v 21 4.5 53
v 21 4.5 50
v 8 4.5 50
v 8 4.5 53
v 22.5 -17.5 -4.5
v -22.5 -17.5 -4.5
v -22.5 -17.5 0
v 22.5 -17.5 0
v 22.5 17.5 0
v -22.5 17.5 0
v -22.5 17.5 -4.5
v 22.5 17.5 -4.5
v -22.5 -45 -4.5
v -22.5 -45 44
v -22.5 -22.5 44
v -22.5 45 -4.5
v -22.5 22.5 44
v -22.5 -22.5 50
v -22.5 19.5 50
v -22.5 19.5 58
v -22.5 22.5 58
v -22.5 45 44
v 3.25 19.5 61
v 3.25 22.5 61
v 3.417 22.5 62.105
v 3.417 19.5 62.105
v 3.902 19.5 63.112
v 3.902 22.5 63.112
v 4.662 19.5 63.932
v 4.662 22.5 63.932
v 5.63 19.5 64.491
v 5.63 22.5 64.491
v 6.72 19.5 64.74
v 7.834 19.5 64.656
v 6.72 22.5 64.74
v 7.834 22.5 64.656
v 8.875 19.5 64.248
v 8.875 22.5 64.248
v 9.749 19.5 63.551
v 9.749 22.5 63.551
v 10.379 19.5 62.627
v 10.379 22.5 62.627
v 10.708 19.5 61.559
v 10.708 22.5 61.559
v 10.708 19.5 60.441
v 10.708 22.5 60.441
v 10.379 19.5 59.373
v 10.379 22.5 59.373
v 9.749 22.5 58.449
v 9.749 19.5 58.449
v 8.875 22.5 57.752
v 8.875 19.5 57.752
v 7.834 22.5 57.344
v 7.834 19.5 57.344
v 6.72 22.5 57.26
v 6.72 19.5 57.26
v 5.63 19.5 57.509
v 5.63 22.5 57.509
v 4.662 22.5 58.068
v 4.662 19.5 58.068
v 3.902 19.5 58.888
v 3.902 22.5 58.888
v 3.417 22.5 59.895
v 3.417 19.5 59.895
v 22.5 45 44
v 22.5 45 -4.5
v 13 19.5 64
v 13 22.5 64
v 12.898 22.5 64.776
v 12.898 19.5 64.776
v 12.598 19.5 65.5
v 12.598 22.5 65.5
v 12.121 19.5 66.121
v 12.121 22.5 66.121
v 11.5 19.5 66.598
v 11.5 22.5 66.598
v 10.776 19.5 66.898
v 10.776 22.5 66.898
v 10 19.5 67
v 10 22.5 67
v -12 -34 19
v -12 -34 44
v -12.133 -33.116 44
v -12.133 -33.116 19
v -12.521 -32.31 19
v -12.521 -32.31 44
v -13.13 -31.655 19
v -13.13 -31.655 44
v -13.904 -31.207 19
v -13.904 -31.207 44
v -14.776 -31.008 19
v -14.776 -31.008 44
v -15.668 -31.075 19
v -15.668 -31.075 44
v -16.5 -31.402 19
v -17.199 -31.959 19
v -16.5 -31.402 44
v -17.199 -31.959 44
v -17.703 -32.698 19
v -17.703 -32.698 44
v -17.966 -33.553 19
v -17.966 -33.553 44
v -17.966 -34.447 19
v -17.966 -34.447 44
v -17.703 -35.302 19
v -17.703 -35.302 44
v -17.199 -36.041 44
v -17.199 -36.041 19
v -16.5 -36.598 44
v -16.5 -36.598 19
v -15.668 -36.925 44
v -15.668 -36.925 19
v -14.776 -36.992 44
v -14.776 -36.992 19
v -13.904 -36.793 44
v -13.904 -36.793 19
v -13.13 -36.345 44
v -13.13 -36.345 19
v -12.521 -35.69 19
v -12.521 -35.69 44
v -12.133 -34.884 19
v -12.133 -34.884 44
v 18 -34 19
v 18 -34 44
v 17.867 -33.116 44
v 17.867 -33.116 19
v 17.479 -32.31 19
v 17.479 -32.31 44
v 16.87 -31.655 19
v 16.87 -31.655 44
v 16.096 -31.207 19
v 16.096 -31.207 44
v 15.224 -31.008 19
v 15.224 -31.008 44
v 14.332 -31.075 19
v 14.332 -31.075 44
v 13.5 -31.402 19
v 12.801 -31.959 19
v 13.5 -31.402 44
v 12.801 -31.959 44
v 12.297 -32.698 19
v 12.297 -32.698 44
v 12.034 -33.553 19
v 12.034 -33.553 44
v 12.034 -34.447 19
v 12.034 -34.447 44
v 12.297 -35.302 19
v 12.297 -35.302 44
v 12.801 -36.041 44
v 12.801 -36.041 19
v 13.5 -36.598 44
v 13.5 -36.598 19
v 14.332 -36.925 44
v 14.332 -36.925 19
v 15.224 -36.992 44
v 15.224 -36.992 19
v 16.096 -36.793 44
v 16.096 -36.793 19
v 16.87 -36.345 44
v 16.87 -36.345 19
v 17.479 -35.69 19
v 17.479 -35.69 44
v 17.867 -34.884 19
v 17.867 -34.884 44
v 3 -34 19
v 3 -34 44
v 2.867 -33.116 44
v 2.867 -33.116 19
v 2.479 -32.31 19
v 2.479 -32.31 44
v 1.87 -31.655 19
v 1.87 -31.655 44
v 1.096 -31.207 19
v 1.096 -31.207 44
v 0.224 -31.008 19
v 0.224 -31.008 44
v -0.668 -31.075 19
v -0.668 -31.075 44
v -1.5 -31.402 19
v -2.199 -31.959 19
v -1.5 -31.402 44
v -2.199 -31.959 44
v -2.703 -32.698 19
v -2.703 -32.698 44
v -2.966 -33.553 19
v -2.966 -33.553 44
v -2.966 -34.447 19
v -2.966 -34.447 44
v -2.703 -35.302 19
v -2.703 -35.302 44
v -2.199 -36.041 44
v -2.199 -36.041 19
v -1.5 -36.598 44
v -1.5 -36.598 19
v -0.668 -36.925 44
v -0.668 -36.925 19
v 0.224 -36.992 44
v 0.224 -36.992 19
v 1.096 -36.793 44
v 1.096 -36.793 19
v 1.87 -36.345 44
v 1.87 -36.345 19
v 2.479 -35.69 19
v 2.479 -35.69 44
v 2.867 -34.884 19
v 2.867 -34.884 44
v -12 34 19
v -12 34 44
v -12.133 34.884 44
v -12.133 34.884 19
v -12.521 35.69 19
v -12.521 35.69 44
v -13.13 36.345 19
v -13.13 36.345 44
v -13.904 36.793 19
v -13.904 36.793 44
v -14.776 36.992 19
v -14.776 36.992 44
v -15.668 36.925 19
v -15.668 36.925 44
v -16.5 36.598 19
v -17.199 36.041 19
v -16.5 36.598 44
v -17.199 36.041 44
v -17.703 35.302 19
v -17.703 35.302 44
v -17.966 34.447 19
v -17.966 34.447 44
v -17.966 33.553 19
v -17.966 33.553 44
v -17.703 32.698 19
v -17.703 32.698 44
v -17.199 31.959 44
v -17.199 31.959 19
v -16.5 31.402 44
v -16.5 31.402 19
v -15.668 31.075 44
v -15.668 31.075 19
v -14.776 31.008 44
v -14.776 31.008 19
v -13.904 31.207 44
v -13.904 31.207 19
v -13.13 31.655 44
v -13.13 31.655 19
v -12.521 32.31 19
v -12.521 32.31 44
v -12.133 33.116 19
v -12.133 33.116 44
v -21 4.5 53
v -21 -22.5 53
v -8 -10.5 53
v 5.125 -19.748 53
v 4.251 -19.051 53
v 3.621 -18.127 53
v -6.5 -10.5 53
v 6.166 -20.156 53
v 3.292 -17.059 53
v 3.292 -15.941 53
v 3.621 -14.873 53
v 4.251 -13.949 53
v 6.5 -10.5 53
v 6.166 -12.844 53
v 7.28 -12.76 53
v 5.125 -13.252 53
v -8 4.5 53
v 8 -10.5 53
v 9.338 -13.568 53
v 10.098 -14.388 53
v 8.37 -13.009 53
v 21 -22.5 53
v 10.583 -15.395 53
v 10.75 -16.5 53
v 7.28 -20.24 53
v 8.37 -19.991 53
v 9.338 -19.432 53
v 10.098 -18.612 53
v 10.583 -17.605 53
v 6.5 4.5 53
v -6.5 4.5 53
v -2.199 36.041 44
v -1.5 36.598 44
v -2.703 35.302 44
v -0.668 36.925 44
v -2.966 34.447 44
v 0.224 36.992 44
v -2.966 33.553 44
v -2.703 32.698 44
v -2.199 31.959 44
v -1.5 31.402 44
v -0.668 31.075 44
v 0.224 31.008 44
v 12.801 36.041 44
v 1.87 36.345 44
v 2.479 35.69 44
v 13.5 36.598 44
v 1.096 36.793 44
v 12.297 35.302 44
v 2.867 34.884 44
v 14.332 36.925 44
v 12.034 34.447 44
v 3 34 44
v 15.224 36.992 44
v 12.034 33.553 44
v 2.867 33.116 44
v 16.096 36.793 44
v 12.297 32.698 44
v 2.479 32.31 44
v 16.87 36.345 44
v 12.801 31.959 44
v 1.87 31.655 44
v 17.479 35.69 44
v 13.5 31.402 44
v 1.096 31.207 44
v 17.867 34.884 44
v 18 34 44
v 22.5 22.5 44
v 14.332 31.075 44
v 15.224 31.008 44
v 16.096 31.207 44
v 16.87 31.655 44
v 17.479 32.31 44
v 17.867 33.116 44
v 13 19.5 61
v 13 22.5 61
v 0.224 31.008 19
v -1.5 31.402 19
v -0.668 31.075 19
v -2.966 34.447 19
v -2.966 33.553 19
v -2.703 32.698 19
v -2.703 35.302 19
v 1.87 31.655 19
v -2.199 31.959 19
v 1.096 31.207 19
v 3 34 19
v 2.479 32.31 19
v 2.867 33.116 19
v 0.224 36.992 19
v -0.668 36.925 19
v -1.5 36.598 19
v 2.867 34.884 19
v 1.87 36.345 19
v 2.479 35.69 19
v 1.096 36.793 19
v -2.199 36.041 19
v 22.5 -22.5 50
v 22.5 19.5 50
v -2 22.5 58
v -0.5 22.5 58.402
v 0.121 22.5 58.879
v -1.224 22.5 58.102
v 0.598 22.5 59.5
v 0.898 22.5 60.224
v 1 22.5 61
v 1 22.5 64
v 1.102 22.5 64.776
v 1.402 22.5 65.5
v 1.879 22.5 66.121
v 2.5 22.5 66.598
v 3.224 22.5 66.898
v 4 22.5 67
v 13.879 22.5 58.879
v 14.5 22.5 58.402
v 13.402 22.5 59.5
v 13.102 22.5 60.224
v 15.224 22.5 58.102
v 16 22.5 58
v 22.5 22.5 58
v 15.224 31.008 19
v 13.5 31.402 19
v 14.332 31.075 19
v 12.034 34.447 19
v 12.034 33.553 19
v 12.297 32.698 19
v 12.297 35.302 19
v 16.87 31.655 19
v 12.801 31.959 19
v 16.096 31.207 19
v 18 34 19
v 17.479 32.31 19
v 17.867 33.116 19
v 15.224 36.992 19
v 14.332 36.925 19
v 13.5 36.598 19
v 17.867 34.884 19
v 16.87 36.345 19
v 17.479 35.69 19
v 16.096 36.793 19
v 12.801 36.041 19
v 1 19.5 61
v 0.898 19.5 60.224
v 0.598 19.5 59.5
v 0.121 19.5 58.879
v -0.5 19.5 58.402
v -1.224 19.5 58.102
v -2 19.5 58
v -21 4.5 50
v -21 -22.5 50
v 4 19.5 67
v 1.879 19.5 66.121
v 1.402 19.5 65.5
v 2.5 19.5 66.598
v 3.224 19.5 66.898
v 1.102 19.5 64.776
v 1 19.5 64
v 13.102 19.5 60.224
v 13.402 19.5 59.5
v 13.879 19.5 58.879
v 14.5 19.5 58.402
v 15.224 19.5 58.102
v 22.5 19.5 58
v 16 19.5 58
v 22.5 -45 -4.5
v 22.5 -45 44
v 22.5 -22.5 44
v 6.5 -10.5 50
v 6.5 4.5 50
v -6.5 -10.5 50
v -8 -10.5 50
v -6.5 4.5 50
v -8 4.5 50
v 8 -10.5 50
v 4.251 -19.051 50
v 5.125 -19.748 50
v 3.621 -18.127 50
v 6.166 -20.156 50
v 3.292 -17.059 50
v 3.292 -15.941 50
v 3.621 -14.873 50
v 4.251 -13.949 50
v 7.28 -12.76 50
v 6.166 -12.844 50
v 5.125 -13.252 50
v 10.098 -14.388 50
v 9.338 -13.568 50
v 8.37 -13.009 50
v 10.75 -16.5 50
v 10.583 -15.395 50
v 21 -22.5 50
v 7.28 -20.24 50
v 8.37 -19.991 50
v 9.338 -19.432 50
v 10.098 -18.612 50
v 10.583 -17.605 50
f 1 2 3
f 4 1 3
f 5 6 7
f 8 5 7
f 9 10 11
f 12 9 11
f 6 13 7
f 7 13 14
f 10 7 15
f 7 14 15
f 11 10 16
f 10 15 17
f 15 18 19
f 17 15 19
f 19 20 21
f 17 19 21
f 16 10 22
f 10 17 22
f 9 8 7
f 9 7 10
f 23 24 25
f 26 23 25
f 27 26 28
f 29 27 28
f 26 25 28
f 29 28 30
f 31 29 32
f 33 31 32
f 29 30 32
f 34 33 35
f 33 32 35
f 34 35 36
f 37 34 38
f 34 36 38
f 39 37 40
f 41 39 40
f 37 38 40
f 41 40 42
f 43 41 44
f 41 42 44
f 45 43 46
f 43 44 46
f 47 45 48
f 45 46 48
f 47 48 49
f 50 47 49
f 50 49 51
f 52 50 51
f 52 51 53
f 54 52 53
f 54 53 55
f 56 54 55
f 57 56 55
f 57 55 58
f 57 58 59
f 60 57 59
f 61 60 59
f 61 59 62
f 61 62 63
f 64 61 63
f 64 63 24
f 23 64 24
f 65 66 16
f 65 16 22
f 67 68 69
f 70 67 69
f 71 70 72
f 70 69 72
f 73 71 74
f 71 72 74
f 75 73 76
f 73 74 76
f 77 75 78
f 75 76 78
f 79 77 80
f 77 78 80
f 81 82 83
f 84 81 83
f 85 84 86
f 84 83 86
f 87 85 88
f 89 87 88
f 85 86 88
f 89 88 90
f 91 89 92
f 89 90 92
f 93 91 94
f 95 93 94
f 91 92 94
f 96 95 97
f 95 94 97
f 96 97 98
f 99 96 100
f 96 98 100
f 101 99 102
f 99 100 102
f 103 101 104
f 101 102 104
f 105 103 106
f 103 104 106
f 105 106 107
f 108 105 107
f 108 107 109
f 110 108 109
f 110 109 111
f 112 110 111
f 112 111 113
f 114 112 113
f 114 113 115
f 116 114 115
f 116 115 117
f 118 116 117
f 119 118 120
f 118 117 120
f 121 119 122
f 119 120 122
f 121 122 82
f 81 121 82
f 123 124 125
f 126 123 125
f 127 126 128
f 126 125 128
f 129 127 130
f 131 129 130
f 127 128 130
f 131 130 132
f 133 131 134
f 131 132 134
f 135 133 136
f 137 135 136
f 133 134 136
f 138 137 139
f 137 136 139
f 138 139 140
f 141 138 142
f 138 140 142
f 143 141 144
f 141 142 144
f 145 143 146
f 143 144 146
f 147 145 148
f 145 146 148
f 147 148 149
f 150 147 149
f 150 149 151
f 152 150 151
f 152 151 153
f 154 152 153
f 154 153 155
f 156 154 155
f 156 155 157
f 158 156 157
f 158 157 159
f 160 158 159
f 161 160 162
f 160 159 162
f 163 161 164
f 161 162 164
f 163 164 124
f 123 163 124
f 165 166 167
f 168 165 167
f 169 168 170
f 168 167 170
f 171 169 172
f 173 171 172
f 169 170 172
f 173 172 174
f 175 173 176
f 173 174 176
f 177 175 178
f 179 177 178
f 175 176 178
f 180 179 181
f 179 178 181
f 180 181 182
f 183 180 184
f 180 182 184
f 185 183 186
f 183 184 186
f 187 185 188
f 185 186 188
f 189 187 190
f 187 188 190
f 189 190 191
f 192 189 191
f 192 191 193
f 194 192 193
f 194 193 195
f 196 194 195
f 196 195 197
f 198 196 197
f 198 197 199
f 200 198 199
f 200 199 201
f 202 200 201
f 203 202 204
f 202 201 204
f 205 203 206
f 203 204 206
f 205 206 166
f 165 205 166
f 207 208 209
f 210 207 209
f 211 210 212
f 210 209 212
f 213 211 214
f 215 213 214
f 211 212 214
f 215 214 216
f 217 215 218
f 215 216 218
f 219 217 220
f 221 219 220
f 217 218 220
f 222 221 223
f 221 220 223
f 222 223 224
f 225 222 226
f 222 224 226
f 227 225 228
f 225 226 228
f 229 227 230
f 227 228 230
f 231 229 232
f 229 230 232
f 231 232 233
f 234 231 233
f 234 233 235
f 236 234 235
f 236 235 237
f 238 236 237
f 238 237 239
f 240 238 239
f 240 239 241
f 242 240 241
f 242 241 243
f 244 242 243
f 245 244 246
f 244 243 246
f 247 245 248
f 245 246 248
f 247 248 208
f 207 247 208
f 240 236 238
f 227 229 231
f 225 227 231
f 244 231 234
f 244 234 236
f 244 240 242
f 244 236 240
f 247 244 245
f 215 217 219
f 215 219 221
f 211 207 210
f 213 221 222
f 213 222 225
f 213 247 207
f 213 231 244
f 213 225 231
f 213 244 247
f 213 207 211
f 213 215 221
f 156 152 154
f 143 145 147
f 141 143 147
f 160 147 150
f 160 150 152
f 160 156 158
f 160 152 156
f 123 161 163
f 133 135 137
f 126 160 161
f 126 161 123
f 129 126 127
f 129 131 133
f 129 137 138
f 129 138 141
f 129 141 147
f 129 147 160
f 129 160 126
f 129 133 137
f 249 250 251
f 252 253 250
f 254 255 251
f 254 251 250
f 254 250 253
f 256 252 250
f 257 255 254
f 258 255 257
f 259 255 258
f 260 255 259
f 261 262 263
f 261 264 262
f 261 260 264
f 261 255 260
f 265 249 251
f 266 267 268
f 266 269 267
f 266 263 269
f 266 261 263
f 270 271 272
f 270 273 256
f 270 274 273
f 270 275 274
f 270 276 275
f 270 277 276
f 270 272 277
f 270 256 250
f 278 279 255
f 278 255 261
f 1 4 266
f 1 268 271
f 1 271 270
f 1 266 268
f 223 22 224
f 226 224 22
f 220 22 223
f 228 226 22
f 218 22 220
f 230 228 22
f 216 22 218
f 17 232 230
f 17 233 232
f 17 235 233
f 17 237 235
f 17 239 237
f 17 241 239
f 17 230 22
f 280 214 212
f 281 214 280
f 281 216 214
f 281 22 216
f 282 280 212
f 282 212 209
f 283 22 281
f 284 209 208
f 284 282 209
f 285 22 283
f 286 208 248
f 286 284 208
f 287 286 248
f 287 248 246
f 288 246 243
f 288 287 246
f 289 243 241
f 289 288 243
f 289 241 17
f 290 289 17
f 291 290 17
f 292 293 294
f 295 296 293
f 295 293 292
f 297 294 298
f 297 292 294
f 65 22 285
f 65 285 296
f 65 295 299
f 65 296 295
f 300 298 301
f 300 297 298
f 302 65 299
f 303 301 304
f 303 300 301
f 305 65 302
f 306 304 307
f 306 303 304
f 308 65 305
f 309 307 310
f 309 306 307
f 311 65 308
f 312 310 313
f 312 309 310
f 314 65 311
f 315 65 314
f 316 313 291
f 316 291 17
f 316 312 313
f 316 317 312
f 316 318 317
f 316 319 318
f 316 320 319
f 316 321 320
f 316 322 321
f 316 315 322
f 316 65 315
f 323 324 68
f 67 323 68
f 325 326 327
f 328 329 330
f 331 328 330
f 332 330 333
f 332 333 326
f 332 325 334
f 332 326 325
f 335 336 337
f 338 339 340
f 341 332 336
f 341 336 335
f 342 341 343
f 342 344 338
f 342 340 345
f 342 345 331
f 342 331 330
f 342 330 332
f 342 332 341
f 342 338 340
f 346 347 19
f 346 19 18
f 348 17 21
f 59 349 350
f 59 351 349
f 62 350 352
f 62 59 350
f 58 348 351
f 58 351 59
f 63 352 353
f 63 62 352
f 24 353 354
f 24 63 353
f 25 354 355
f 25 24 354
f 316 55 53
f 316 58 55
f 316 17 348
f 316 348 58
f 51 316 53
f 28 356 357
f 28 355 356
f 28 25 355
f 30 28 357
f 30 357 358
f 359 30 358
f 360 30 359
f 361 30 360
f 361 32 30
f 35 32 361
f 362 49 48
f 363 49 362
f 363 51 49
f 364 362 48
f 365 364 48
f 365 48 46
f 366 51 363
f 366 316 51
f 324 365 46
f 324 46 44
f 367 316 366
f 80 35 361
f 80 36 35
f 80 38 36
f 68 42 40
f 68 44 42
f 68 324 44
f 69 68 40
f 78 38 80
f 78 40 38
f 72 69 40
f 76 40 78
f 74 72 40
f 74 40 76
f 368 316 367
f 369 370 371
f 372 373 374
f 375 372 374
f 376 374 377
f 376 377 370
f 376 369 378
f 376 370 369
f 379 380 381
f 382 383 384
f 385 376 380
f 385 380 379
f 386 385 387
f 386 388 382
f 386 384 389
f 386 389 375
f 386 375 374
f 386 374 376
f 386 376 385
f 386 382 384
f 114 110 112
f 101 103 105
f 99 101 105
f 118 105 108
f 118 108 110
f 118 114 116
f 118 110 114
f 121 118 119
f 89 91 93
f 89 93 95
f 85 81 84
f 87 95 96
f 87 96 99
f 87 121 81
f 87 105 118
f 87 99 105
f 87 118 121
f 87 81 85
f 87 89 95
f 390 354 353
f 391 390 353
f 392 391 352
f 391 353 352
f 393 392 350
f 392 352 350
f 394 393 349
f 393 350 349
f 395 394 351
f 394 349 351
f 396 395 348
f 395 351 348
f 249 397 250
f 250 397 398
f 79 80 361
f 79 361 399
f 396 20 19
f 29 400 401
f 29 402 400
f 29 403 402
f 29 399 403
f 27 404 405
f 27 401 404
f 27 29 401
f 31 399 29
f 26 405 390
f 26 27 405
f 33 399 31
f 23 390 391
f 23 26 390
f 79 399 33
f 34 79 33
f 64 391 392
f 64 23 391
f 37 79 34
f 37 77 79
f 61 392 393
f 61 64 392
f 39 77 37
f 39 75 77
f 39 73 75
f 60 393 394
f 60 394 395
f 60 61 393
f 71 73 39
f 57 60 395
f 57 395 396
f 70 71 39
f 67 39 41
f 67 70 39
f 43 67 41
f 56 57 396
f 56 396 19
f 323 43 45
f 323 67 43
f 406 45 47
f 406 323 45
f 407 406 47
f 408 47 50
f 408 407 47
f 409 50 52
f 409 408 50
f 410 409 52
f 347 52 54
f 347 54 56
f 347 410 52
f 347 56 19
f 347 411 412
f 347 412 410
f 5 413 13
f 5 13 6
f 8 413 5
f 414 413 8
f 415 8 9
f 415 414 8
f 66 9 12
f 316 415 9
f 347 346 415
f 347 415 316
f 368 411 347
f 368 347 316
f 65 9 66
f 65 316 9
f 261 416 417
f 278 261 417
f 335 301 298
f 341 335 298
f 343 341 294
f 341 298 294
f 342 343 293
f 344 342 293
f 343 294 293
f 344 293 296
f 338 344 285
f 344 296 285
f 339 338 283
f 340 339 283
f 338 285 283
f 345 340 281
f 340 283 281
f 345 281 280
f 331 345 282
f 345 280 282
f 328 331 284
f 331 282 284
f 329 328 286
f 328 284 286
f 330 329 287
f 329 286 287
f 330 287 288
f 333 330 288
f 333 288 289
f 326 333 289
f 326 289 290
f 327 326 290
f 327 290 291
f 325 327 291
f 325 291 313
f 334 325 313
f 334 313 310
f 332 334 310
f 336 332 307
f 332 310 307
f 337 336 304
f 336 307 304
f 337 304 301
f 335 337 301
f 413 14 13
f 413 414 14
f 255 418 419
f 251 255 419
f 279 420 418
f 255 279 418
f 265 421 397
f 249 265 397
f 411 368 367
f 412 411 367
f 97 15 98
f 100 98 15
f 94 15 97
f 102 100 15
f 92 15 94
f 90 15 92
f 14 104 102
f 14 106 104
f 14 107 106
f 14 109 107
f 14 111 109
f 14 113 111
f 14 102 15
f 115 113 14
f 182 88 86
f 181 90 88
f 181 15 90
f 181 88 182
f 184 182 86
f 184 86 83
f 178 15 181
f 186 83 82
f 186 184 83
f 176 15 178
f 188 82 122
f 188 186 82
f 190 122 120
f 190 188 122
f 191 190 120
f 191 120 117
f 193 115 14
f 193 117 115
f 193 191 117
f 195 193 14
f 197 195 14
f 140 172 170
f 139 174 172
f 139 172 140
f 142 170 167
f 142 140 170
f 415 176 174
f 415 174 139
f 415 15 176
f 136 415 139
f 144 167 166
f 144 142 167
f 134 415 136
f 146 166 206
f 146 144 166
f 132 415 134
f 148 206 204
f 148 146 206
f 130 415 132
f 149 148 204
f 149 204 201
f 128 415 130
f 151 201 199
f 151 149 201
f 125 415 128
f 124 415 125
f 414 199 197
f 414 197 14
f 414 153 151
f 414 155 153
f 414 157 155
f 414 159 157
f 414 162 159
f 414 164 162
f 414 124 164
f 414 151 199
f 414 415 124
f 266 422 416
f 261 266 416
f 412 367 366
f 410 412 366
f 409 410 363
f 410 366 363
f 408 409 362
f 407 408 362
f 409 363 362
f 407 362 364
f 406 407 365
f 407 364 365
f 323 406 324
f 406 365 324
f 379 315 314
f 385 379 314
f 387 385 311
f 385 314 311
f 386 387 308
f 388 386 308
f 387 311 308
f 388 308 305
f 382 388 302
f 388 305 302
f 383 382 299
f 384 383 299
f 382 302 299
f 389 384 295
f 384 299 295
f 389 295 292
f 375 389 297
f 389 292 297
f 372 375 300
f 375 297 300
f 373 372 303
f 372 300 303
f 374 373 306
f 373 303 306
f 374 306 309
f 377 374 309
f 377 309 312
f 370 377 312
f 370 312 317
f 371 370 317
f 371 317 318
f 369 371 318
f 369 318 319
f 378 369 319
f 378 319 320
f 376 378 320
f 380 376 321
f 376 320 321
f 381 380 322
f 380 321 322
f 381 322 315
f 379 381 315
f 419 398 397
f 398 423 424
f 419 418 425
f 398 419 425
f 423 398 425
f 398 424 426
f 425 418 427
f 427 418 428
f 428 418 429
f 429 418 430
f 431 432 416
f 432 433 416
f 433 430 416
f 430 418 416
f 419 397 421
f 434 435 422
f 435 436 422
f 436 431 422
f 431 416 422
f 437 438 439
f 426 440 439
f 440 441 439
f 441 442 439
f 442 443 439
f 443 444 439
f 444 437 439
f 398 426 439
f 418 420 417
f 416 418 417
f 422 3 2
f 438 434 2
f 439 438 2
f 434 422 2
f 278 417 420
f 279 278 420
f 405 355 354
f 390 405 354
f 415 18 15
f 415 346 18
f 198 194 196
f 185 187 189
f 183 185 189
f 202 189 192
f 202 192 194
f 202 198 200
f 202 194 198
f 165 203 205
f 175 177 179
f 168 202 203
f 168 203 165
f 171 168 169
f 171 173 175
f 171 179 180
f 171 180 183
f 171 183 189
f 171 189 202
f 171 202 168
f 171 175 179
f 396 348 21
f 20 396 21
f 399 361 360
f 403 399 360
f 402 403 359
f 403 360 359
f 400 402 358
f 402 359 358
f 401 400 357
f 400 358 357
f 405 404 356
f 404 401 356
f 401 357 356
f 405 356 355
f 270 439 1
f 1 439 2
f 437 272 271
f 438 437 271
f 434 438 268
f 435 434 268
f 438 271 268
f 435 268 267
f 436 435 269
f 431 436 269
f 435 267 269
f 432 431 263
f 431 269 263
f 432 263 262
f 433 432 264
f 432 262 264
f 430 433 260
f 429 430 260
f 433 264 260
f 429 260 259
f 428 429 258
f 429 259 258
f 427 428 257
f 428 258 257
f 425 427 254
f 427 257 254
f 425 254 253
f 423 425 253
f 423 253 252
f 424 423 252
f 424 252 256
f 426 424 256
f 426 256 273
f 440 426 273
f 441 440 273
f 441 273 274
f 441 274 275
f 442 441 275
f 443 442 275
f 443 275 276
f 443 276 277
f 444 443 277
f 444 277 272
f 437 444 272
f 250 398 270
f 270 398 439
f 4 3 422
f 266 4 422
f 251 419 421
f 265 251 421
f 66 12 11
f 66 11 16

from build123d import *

# Parameters (mm, degrees)
F1_DEPTH = 22.5
F2_R     = 3.75
F3_DEPTH = 25
F5_DEPTH = 3
F6_R     = 3
F7_DEPTH = 25
F8_R     = 3.75
F9_DEPTH = 25


with BuildPart() as f1:
    # F0 (on Right) → F1 (new body, symmetric)
    with BuildSketch(Plane.YZ):
        Polygon((-45, 44), (-45, -4.5), (-17.5, -4.5), (-17.5, 0), (17.5, 0), (17.5, -4.5), (45, -4.5), (45, 44), (22.5, 44), (22.5, 67), (19.5, 67), (19.5, 50), (-22.5, 50), (-22.5, 44), align=None)
    extrude(amount=F1_DEPTH, both=True)

    # F2 (on face) → F3 (cut)
    with BuildSketch(Plane(origin=(0, 22.5, 0), x_dir=(-1, 0, 0), z_dir=(0, 1, 0))):
        with Locations((-7, 61)):
            Circle(F2_R)
        with BuildLine():
            Line((-13, 61), (-13, 64))
            ThreePointArc((-13, 64), (-12.1213203436, 66.1213203436), (-10, 67))
            Line((-10, 67), (-4, 67))
            ThreePointArc((-4, 67), (-1.8786796564, 66.1213203436), (-1, 64))
            Line((-1, 64), (-1, 61))
            ThreePointArc((-1, 61), (-0.1213203436, 58.8786796564), (2, 58))
            Line((2, 58), (22.5, 58))
            Line((22.5, 58), (37.2377703208, 58))
            Line((37.2377703208, 58), (37.2377703208, 73.085991472))
            Line((37.2377703208, 73.085991472), (-27.5872001182, 73.085991472))
            Line((-27.5872001182, 73.085991472), (-27.5872001182, 58))
            Line((-27.5872001182, 58), (-22.5, 58))
            Line((-22.5, 58), (-16, 58))
            ThreePointArc((-16, 58), (-13.8786796564, 58.8786796564), (-13, 61))
        make_face()
    extrude(amount=-F3_DEPTH, mode=Mode.SUBTRACT)

    # F6 (on face) → F7 (cut)
    with BuildSketch(Plane.XY.offset(44)):
        with Locations((15, -34)):
            Circle(F6_R)
        with Locations((-15, -34)):
            Circle(F6_R)
        with Locations((0, -34)):
            Circle(F6_R)
        with Locations((-15, 34)):
            Circle(F6_R)
        with Locations((0, 34)):
            Circle(F6_R)
        with Locations((15, 34)):
            Circle(F6_R)
    extrude(amount=-F7_DEPTH, mode=Mode.SUBTRACT)


with BuildPart() as f5:
    # F4 (on face) → F5 (new body)
    with BuildSketch(Plane.XY.offset(50)):
        Polygon((-21, -22.5), (21, -22.5), (21, 4.5), (8, 4.5), (8, -10.5), (6.5, -10.5), (6.5, 4.5), (-6.5, 4.5), (-6.5, -10.5), (-8, -10.5), (-8, 4.5), (-21, 4.5), align=None)
    extrude(amount=F5_DEPTH)

    # F8 (on face) → F9 (cut)
    with BuildSketch(Plane.XY.offset(53)):
        with Locations((7, -16.5)):
            Circle(F8_R)
    extrude(amount=-F9_DEPTH, mode=Mode.SUBTRACT)


solid = Compound([f1.part, f5.part])
